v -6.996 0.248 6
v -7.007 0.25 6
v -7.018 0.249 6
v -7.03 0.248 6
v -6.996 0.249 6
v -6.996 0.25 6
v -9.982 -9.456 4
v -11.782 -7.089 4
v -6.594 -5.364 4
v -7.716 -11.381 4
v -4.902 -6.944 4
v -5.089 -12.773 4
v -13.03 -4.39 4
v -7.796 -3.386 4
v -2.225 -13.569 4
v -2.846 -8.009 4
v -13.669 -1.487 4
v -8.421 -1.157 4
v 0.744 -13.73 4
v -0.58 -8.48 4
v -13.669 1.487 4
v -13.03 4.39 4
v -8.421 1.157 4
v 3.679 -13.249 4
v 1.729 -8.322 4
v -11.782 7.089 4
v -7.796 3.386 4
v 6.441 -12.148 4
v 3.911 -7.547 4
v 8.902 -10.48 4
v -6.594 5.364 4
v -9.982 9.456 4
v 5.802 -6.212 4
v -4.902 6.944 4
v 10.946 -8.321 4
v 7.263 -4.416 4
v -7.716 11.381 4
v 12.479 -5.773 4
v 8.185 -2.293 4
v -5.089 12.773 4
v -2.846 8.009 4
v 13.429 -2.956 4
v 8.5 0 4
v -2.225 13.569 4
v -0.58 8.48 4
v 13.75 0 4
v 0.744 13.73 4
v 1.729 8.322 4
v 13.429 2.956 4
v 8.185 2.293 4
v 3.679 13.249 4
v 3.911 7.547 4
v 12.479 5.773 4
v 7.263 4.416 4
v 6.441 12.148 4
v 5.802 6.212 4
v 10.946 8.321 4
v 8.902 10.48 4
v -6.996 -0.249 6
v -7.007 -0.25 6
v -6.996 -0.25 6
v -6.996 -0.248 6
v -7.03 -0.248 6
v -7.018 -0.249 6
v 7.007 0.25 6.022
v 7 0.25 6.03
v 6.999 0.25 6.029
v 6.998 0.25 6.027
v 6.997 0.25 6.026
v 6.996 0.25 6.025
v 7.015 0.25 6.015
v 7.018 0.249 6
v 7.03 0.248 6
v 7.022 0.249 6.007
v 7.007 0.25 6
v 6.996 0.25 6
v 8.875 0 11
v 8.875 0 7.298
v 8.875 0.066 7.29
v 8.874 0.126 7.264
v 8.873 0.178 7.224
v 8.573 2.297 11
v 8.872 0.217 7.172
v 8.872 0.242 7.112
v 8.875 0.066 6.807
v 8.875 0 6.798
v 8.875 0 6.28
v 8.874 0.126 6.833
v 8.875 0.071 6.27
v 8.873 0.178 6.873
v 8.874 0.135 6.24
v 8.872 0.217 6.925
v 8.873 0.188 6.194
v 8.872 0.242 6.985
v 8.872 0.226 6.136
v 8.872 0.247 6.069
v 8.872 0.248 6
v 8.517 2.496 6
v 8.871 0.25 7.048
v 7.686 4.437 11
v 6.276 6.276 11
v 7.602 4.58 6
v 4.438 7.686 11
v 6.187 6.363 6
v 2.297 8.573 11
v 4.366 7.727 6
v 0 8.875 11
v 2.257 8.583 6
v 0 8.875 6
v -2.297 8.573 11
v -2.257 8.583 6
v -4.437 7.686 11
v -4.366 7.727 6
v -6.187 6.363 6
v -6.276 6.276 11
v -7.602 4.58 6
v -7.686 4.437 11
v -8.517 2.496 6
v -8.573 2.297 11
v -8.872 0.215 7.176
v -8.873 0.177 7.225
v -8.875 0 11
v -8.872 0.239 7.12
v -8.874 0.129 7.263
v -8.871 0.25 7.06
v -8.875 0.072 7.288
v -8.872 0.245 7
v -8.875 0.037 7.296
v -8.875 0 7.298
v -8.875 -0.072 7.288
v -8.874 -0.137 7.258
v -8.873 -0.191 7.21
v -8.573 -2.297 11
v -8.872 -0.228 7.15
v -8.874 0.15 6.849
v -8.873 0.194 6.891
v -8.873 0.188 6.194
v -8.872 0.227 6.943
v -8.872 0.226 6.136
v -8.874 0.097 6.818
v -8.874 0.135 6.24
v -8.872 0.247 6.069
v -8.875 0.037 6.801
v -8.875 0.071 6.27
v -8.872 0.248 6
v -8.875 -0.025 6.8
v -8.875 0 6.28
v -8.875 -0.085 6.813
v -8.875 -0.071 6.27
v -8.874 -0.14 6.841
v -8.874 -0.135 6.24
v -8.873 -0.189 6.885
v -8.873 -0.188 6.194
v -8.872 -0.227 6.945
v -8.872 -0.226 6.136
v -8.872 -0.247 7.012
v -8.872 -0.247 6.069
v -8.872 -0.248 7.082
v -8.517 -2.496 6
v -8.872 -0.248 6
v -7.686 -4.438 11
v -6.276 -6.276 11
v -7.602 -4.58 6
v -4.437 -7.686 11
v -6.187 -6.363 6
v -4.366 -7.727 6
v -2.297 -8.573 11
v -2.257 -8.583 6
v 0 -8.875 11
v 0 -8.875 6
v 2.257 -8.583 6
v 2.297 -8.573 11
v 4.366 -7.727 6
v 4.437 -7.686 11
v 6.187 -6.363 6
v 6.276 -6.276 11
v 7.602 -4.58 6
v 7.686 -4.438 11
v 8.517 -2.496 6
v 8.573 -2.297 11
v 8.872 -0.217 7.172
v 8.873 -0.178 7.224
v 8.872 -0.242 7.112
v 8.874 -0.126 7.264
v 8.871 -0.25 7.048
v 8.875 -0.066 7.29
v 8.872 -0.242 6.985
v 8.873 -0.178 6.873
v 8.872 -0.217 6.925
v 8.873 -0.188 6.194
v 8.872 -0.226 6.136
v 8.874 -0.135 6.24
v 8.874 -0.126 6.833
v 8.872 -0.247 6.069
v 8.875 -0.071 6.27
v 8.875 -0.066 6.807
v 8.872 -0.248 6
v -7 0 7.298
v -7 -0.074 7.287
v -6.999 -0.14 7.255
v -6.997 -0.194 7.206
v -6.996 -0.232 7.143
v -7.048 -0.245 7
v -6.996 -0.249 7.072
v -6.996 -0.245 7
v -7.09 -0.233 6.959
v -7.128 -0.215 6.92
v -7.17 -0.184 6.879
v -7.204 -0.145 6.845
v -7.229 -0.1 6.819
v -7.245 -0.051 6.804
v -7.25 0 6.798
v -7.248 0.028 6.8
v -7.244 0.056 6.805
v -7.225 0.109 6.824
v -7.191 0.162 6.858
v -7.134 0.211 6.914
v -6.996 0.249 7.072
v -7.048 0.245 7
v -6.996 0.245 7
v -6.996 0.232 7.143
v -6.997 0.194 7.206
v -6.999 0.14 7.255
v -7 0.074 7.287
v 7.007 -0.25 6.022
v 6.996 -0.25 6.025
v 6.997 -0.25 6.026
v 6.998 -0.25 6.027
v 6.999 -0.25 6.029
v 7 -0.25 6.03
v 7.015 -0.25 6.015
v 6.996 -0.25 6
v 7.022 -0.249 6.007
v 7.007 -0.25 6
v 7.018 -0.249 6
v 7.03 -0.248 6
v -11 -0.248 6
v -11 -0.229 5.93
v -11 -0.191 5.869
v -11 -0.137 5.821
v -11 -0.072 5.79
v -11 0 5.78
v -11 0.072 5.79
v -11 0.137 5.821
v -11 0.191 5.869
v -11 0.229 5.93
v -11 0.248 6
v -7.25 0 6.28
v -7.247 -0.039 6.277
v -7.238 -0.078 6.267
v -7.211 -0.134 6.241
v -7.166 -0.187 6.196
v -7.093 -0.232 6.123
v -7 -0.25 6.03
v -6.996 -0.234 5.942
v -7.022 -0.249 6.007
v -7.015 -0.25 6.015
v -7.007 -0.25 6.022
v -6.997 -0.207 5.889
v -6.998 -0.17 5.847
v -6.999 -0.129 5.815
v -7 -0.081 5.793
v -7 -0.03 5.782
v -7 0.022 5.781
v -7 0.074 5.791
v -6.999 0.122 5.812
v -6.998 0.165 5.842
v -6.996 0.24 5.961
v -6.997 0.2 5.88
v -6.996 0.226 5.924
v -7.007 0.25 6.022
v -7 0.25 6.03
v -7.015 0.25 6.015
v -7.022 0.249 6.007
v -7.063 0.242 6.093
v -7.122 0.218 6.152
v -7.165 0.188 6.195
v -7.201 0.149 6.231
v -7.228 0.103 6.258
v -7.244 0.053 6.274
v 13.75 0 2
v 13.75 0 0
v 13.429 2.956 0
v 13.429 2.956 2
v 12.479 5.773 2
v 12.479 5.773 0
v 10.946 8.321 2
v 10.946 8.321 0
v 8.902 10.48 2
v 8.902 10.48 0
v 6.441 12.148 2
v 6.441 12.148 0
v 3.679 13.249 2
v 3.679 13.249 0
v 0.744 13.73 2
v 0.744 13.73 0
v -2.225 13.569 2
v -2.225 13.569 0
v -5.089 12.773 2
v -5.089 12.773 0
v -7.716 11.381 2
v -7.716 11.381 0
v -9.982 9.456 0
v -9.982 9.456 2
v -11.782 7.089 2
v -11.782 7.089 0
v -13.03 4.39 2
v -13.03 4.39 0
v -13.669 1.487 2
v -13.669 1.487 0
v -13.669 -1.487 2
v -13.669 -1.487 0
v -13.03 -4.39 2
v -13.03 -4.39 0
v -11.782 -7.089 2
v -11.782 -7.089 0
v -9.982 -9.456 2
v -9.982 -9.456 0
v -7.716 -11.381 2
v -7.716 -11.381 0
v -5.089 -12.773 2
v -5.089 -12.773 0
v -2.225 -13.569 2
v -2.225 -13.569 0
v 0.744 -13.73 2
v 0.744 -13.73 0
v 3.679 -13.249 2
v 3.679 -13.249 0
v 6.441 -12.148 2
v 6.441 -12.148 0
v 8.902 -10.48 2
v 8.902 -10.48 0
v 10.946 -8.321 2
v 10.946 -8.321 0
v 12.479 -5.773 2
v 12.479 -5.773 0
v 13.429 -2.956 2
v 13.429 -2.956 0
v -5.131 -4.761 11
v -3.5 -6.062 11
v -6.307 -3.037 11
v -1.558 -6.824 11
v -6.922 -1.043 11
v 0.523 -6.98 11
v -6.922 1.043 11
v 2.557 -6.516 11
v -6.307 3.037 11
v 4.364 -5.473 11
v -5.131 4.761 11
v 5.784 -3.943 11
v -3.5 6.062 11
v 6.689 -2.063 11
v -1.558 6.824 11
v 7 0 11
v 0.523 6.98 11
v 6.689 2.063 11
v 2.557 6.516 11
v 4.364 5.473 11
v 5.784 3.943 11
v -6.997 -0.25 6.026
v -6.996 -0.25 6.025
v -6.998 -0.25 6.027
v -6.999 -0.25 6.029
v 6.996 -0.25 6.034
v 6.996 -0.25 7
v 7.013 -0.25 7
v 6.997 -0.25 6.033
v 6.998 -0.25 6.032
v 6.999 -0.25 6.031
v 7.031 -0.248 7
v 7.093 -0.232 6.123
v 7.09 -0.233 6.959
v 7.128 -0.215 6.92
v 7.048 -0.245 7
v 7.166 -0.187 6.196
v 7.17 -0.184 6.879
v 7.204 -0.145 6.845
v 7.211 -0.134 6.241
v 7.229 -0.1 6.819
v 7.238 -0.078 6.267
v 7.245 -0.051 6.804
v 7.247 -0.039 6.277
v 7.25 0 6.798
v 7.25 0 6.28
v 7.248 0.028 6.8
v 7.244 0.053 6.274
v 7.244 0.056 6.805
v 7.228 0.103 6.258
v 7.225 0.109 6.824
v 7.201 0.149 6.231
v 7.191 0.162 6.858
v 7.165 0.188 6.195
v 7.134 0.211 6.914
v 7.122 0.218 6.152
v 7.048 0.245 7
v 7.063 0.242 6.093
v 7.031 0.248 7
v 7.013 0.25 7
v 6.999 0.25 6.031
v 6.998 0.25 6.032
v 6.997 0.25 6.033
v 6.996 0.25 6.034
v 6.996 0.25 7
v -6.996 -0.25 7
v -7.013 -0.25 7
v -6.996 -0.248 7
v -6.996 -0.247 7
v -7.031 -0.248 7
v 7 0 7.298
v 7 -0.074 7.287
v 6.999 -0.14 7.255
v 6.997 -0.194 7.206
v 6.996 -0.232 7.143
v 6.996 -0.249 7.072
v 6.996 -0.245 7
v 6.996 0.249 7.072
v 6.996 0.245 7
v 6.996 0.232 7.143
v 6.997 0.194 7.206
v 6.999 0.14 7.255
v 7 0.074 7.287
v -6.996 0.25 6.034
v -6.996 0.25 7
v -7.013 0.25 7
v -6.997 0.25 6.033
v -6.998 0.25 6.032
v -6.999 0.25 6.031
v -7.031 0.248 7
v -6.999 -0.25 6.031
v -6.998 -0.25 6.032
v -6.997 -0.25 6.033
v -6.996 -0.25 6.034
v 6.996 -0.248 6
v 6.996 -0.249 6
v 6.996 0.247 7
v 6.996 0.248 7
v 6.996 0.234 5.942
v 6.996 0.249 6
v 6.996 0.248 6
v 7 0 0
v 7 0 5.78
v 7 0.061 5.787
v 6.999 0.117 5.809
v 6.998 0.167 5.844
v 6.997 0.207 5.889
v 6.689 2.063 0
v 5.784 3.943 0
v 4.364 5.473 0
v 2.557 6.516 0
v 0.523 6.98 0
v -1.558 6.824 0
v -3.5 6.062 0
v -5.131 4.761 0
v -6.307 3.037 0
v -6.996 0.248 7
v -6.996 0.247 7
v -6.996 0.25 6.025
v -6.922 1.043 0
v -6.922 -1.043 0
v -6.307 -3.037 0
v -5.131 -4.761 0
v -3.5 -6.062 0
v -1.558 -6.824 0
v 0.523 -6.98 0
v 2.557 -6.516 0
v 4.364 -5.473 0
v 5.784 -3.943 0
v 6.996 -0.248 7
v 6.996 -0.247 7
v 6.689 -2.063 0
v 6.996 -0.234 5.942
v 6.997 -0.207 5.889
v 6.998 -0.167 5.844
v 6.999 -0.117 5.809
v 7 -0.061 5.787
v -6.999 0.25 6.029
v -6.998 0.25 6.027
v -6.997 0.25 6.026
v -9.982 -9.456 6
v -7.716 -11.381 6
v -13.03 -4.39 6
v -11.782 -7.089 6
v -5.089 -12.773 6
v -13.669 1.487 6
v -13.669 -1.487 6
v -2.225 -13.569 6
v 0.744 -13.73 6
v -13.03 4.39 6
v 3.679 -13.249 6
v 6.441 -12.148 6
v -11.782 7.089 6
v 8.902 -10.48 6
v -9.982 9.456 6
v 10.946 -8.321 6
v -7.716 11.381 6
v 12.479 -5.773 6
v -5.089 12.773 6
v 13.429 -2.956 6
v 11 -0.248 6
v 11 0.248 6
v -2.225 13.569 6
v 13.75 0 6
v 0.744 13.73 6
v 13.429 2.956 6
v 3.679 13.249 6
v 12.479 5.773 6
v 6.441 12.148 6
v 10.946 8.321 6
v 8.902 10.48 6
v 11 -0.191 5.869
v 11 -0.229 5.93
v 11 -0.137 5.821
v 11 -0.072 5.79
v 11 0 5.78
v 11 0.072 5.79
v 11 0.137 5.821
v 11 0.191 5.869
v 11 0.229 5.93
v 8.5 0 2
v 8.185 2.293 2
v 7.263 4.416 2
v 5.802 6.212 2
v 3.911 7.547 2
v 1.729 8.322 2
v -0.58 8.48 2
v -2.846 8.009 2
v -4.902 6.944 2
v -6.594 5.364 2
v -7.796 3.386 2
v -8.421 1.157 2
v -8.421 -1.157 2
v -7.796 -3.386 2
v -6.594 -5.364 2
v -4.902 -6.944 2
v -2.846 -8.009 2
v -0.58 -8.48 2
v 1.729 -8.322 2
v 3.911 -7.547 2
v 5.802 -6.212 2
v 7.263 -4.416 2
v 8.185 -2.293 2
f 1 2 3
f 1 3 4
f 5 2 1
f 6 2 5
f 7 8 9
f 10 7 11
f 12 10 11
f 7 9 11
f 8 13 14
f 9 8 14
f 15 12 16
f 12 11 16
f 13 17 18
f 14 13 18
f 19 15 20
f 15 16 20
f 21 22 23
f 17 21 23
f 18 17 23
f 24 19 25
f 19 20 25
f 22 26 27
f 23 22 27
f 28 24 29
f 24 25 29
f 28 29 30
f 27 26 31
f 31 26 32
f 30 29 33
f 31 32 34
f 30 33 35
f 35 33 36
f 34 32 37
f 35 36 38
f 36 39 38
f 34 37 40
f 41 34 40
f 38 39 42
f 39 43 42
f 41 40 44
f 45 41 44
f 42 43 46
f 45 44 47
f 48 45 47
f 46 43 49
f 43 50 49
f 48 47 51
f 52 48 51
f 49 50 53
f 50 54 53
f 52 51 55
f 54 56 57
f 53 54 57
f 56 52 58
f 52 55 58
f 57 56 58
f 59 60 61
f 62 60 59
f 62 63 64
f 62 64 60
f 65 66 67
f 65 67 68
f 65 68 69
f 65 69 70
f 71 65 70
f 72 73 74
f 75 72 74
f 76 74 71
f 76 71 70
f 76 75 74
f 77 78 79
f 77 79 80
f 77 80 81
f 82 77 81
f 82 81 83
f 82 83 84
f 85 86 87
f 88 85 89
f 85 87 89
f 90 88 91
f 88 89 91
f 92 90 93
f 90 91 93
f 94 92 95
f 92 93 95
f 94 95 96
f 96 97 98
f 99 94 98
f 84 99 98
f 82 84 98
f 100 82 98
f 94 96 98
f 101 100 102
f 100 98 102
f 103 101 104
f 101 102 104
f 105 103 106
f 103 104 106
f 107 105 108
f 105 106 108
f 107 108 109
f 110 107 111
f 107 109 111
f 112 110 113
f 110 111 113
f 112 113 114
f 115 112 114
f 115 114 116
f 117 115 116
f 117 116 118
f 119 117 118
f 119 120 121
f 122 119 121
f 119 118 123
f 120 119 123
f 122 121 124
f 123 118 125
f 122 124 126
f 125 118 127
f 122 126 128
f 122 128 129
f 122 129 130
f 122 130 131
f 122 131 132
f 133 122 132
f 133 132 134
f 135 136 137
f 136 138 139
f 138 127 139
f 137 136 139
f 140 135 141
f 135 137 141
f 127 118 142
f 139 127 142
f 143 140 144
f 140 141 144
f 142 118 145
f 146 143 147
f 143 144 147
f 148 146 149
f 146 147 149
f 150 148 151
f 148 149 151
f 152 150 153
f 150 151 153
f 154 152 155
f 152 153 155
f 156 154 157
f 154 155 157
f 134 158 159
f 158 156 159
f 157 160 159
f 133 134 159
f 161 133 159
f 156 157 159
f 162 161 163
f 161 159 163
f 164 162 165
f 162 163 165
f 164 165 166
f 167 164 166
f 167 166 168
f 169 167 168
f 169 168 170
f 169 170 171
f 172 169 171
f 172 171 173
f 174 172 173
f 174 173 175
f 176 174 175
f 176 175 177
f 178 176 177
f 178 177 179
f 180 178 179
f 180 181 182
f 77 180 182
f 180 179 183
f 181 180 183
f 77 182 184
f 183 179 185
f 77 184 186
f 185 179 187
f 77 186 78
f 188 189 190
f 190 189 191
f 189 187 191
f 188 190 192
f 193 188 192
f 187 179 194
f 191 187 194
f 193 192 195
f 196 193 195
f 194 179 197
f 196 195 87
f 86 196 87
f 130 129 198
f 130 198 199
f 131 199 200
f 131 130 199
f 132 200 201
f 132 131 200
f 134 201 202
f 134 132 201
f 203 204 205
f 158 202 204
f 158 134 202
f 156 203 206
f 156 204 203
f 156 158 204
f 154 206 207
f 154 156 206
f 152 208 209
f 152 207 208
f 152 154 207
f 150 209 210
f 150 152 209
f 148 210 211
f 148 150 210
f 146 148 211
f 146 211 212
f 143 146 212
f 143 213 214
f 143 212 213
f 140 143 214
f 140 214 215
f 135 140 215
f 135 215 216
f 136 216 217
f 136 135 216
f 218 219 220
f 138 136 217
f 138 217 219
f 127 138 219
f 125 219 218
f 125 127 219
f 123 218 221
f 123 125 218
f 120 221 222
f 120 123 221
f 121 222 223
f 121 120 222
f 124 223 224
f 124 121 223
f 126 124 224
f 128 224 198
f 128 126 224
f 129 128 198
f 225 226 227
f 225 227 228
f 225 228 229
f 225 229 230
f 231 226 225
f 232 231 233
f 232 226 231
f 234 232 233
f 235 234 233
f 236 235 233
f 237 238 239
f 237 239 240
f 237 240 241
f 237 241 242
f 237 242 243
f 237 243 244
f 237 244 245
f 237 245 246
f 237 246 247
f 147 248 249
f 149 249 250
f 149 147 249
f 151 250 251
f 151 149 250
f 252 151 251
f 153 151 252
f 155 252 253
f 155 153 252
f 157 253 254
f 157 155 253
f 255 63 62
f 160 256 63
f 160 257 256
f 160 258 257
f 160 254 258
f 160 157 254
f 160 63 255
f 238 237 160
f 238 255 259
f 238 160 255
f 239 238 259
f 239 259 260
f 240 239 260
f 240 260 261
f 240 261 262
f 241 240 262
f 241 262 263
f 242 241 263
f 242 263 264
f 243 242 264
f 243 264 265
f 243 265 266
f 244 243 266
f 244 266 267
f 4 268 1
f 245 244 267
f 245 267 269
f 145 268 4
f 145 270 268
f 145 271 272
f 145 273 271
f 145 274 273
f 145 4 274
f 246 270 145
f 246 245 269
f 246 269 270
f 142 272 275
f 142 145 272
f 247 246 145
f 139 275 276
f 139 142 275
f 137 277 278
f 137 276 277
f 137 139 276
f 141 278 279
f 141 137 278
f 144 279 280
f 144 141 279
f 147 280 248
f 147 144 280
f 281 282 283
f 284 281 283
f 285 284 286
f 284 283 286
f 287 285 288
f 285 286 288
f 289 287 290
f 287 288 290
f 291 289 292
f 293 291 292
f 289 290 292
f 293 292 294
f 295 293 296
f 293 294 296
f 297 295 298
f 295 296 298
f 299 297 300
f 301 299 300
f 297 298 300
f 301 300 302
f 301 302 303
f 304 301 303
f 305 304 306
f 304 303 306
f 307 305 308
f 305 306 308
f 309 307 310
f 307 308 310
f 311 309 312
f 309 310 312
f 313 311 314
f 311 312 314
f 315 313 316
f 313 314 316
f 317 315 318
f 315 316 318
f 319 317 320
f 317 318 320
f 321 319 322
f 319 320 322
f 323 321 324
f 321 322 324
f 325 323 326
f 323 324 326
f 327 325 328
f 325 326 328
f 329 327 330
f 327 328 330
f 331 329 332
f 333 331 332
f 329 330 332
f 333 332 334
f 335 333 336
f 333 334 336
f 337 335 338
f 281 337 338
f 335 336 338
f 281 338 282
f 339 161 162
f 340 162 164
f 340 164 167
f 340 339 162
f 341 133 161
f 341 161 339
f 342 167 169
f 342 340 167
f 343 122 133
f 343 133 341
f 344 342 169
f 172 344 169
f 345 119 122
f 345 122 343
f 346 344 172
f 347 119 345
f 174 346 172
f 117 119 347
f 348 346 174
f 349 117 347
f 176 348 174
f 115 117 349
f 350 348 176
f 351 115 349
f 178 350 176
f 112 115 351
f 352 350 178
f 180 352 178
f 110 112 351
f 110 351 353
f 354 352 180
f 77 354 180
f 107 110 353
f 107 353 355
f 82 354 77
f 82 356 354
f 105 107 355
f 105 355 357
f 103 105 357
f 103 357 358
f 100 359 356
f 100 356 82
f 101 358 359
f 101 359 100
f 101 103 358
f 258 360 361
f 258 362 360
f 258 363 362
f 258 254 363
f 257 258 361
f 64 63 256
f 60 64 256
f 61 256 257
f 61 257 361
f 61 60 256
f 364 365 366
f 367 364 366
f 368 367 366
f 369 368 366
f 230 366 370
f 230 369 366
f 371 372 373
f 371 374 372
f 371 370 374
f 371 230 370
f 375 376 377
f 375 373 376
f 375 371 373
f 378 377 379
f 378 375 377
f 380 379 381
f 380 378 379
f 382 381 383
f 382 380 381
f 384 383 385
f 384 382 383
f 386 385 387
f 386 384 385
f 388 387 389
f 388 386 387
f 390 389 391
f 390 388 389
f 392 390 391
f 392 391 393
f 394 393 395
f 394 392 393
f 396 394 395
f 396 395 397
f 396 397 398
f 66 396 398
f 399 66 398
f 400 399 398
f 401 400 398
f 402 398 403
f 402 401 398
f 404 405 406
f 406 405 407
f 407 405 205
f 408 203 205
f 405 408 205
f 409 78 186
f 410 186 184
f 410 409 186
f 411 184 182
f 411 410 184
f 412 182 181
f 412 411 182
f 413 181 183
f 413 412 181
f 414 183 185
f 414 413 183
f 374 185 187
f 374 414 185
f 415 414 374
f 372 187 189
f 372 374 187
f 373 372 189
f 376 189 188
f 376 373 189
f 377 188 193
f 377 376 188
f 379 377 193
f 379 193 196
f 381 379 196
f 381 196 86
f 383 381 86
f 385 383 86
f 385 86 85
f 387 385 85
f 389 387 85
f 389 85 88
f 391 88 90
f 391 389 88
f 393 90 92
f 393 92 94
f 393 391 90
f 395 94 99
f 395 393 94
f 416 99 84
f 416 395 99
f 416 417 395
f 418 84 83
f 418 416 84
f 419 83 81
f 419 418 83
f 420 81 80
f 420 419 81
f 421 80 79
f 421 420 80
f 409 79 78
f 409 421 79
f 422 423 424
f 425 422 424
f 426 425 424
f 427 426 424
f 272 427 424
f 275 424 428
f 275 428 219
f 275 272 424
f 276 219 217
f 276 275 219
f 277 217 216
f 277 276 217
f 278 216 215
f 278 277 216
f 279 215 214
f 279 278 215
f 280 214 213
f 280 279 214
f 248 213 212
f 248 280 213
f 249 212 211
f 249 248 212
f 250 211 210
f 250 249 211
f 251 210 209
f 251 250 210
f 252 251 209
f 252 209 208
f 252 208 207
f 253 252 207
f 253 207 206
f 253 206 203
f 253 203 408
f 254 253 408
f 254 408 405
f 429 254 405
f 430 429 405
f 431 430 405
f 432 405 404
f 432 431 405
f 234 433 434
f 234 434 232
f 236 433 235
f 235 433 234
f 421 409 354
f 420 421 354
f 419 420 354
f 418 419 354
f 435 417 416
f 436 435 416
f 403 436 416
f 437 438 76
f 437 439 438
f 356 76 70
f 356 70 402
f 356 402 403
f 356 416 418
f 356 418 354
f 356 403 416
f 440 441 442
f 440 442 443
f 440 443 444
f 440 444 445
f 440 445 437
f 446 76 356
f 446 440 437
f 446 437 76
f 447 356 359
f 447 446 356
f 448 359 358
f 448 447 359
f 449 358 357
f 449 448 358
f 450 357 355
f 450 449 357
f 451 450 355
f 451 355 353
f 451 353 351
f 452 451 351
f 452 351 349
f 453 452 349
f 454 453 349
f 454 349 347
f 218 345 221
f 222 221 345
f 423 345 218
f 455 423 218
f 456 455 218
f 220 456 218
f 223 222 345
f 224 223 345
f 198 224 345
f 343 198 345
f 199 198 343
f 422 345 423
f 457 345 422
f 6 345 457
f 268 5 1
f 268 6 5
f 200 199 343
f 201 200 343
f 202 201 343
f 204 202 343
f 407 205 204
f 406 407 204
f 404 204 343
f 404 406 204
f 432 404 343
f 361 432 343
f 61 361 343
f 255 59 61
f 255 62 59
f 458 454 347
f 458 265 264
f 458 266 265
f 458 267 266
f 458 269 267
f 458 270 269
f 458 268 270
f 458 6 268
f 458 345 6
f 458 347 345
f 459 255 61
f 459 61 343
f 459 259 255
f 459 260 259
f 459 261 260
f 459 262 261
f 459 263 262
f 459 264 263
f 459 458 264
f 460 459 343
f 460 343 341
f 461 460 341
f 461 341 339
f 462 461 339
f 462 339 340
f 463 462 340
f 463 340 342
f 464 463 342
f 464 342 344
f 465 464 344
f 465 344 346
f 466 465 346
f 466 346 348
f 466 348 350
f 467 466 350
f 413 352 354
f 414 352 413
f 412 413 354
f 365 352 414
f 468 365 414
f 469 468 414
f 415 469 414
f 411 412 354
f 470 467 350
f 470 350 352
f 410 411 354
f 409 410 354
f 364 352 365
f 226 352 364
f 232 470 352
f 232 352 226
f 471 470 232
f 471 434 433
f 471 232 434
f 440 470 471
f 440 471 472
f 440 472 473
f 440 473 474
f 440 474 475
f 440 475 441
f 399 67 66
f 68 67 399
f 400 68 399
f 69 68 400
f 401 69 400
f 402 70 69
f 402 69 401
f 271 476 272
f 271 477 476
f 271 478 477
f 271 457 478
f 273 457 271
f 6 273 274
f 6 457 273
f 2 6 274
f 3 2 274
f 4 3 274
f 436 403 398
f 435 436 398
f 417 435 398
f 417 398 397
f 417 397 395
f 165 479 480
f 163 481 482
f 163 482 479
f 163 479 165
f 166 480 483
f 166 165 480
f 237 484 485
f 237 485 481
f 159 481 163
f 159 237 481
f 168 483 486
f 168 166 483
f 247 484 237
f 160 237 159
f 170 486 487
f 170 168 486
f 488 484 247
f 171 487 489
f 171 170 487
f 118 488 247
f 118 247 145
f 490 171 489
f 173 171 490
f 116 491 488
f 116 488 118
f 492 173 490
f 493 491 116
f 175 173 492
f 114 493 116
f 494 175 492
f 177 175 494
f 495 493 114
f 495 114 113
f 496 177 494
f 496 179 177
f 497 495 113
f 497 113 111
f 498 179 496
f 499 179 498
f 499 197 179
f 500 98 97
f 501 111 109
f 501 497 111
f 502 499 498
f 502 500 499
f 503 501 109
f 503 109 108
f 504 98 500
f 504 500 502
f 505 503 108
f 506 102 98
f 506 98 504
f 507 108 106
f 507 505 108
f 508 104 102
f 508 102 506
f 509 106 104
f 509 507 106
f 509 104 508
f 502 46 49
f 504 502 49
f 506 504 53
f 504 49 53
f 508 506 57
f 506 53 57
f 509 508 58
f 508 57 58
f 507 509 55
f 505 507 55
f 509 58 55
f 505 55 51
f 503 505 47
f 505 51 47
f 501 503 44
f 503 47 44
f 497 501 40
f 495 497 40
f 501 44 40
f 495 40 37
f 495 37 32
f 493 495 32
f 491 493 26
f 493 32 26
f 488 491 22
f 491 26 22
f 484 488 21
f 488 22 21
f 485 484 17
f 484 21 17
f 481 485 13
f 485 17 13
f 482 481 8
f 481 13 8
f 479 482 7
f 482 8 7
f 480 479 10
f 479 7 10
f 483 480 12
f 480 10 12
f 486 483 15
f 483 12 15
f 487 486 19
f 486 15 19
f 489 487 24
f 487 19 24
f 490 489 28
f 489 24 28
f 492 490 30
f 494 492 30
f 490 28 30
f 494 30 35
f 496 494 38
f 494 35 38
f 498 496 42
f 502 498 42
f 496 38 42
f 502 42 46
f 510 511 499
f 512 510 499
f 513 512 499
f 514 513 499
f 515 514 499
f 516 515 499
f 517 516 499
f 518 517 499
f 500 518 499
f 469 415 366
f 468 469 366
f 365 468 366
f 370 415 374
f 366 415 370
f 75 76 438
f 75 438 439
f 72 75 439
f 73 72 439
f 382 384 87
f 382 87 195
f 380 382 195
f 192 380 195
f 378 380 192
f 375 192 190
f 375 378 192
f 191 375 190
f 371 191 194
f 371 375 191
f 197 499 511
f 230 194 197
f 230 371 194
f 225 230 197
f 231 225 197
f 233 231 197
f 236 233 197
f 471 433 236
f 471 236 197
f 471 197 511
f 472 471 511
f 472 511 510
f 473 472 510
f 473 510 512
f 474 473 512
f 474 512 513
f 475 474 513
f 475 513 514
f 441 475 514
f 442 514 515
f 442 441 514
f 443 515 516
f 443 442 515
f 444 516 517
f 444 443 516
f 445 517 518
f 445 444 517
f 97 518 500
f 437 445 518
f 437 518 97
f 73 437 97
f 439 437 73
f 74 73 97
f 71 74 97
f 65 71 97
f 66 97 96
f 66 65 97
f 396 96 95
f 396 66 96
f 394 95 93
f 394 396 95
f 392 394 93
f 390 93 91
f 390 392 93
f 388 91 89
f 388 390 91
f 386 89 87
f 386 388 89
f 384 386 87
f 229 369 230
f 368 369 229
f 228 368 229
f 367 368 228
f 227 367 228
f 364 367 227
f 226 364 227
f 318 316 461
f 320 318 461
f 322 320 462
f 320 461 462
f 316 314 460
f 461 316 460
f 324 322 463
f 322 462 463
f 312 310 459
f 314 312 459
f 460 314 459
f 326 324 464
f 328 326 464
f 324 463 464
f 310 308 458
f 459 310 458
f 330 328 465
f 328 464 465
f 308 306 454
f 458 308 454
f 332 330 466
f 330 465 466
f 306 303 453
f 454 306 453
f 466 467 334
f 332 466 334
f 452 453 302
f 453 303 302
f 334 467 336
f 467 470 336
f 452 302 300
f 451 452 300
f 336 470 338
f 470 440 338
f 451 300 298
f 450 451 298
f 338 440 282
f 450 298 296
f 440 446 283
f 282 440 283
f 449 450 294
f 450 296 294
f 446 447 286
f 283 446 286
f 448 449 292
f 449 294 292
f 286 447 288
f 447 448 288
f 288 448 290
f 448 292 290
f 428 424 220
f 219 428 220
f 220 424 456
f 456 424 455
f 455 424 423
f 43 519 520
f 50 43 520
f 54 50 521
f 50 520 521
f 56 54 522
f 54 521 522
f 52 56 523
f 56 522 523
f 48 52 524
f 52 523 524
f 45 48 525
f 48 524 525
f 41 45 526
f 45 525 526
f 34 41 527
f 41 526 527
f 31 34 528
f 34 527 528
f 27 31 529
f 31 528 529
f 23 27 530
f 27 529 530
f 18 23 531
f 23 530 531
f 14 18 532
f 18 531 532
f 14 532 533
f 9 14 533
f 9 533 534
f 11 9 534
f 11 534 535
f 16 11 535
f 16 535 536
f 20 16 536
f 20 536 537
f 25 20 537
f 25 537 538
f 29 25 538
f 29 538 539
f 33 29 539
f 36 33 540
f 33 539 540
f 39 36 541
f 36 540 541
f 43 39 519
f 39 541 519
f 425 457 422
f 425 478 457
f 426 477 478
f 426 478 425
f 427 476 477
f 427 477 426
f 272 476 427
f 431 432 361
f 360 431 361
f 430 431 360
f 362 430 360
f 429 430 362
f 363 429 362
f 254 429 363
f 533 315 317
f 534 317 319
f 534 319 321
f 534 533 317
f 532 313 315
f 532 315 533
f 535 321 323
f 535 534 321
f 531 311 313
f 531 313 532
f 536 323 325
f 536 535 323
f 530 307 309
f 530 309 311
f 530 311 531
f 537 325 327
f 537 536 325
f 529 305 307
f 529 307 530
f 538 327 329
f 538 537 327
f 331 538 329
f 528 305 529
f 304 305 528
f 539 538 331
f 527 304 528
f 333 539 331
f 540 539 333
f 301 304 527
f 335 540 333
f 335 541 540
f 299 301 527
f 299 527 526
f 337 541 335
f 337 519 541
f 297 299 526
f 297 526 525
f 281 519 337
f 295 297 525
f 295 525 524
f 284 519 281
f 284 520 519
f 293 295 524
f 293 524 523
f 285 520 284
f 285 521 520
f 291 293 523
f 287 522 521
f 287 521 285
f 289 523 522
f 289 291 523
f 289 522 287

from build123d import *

# Parameters (mm, degrees)
SKETCH1_R               = 13.75
BOSS_EXTRUDE1_DEPTH     = 2
SKETCH2_R               = 8.5
BOSS_EXTRUDE2_DEPTH     = 6
BOSS_EXTRUDE3_START     = 4
SKETCH3_R               = 13.75
BOSS_EXTRUDE3_DEPTH     = 2
SKETCH5_R               = 7
CUT_EXTRUDE2_DEPTH      = 21.350061425
BOSS_EXTRUDE4_START     = 6
SKETCH6_R               = 8.875
SKETCH6_R_2             = 7
BOSS_EXTRUDE4_DEPTH     = 5
CUT_EXTRUDE7_DEPTH      = 11
CUT_EXTRUDE7_DEPTH_BACK = 11
SKETCH17_R              = 0.25
CUT_EXTRUDE13_START     = 6
SKETCH16_R              = 0.25
CUT_EXTRUDE13_DEPTH     = 1


with BuildPart() as part:
    # Sketch1 → Boss-Extrude1 (new body)
    with BuildSketch(Plane.XY):
        Circle(SKETCH1_R)
    extrude(amount=BOSS_EXTRUDE1_DEPTH)

    # Sketch2 → Boss-Extrude2 (add)
    with BuildSketch(Plane.XY):
        Circle(SKETCH2_R)
    extrude(amount=BOSS_EXTRUDE2_DEPTH)

    # Sketch3 → Boss-Extrude3 (add)
    with BuildSketch(Plane.XY.offset(BOSS_EXTRUDE3_START)):
        Circle(SKETCH3_R)
    extrude(amount=BOSS_EXTRUDE3_DEPTH)

    # Sketch5 → Cut-Extrude2 (cut, through all)
    with BuildSketch(Plane.XY):
        Circle(SKETCH5_R)
    extrude(amount=CUT_EXTRUDE2_DEPTH, mode=Mode.SUBTRACT)

    # Sketch6 → Boss-Extrude4 (add)
    with BuildSketch(Plane.XY.offset(BOSS_EXTRUDE4_START)):
        Circle(SKETCH6_R)
        Circle(SKETCH6_R_2, mode=Mode.SUBTRACT)
    extrude(amount=BOSS_EXTRUDE4_DEPTH)

    # Sketch17 → Cut-Extrude7 (cut, two sides: drawn at the far end of the back side and taken through both)
    with BuildSketch(Plane(origin=(0, 0, 0), x_dir=(0, 0, -1), z_dir=(1, 0, 0)).offset(-CUT_EXTRUDE7_DEPTH_BACK)):
        with Locations(Location((-6.029707429, 0, 0), (0, 0, 180))):
            Circle(SKETCH17_R)
        with Locations(Location((-7.048386429, 0, 0), (0, 0, 180))):
            Circle(SKETCH17_R)
    extrude(amount=CUT_EXTRUDE7_DEPTH + CUT_EXTRUDE7_DEPTH_BACK, mode=Mode.SUBTRACT)

    # Sketch16 → Cut-Extrude13 (cut)
    with BuildSketch(Plane.XY.offset(CUT_EXTRUDE13_START)):
        with Locations((-7, 0)):
            Circle(SKETCH16_R)
        with Locations((7, 0)):
            Circle(SKETCH16_R)
    extrude(amount=CUT_EXTRUDE13_DEPTH, mode=Mode.SUBTRACT)


solid = part.part
